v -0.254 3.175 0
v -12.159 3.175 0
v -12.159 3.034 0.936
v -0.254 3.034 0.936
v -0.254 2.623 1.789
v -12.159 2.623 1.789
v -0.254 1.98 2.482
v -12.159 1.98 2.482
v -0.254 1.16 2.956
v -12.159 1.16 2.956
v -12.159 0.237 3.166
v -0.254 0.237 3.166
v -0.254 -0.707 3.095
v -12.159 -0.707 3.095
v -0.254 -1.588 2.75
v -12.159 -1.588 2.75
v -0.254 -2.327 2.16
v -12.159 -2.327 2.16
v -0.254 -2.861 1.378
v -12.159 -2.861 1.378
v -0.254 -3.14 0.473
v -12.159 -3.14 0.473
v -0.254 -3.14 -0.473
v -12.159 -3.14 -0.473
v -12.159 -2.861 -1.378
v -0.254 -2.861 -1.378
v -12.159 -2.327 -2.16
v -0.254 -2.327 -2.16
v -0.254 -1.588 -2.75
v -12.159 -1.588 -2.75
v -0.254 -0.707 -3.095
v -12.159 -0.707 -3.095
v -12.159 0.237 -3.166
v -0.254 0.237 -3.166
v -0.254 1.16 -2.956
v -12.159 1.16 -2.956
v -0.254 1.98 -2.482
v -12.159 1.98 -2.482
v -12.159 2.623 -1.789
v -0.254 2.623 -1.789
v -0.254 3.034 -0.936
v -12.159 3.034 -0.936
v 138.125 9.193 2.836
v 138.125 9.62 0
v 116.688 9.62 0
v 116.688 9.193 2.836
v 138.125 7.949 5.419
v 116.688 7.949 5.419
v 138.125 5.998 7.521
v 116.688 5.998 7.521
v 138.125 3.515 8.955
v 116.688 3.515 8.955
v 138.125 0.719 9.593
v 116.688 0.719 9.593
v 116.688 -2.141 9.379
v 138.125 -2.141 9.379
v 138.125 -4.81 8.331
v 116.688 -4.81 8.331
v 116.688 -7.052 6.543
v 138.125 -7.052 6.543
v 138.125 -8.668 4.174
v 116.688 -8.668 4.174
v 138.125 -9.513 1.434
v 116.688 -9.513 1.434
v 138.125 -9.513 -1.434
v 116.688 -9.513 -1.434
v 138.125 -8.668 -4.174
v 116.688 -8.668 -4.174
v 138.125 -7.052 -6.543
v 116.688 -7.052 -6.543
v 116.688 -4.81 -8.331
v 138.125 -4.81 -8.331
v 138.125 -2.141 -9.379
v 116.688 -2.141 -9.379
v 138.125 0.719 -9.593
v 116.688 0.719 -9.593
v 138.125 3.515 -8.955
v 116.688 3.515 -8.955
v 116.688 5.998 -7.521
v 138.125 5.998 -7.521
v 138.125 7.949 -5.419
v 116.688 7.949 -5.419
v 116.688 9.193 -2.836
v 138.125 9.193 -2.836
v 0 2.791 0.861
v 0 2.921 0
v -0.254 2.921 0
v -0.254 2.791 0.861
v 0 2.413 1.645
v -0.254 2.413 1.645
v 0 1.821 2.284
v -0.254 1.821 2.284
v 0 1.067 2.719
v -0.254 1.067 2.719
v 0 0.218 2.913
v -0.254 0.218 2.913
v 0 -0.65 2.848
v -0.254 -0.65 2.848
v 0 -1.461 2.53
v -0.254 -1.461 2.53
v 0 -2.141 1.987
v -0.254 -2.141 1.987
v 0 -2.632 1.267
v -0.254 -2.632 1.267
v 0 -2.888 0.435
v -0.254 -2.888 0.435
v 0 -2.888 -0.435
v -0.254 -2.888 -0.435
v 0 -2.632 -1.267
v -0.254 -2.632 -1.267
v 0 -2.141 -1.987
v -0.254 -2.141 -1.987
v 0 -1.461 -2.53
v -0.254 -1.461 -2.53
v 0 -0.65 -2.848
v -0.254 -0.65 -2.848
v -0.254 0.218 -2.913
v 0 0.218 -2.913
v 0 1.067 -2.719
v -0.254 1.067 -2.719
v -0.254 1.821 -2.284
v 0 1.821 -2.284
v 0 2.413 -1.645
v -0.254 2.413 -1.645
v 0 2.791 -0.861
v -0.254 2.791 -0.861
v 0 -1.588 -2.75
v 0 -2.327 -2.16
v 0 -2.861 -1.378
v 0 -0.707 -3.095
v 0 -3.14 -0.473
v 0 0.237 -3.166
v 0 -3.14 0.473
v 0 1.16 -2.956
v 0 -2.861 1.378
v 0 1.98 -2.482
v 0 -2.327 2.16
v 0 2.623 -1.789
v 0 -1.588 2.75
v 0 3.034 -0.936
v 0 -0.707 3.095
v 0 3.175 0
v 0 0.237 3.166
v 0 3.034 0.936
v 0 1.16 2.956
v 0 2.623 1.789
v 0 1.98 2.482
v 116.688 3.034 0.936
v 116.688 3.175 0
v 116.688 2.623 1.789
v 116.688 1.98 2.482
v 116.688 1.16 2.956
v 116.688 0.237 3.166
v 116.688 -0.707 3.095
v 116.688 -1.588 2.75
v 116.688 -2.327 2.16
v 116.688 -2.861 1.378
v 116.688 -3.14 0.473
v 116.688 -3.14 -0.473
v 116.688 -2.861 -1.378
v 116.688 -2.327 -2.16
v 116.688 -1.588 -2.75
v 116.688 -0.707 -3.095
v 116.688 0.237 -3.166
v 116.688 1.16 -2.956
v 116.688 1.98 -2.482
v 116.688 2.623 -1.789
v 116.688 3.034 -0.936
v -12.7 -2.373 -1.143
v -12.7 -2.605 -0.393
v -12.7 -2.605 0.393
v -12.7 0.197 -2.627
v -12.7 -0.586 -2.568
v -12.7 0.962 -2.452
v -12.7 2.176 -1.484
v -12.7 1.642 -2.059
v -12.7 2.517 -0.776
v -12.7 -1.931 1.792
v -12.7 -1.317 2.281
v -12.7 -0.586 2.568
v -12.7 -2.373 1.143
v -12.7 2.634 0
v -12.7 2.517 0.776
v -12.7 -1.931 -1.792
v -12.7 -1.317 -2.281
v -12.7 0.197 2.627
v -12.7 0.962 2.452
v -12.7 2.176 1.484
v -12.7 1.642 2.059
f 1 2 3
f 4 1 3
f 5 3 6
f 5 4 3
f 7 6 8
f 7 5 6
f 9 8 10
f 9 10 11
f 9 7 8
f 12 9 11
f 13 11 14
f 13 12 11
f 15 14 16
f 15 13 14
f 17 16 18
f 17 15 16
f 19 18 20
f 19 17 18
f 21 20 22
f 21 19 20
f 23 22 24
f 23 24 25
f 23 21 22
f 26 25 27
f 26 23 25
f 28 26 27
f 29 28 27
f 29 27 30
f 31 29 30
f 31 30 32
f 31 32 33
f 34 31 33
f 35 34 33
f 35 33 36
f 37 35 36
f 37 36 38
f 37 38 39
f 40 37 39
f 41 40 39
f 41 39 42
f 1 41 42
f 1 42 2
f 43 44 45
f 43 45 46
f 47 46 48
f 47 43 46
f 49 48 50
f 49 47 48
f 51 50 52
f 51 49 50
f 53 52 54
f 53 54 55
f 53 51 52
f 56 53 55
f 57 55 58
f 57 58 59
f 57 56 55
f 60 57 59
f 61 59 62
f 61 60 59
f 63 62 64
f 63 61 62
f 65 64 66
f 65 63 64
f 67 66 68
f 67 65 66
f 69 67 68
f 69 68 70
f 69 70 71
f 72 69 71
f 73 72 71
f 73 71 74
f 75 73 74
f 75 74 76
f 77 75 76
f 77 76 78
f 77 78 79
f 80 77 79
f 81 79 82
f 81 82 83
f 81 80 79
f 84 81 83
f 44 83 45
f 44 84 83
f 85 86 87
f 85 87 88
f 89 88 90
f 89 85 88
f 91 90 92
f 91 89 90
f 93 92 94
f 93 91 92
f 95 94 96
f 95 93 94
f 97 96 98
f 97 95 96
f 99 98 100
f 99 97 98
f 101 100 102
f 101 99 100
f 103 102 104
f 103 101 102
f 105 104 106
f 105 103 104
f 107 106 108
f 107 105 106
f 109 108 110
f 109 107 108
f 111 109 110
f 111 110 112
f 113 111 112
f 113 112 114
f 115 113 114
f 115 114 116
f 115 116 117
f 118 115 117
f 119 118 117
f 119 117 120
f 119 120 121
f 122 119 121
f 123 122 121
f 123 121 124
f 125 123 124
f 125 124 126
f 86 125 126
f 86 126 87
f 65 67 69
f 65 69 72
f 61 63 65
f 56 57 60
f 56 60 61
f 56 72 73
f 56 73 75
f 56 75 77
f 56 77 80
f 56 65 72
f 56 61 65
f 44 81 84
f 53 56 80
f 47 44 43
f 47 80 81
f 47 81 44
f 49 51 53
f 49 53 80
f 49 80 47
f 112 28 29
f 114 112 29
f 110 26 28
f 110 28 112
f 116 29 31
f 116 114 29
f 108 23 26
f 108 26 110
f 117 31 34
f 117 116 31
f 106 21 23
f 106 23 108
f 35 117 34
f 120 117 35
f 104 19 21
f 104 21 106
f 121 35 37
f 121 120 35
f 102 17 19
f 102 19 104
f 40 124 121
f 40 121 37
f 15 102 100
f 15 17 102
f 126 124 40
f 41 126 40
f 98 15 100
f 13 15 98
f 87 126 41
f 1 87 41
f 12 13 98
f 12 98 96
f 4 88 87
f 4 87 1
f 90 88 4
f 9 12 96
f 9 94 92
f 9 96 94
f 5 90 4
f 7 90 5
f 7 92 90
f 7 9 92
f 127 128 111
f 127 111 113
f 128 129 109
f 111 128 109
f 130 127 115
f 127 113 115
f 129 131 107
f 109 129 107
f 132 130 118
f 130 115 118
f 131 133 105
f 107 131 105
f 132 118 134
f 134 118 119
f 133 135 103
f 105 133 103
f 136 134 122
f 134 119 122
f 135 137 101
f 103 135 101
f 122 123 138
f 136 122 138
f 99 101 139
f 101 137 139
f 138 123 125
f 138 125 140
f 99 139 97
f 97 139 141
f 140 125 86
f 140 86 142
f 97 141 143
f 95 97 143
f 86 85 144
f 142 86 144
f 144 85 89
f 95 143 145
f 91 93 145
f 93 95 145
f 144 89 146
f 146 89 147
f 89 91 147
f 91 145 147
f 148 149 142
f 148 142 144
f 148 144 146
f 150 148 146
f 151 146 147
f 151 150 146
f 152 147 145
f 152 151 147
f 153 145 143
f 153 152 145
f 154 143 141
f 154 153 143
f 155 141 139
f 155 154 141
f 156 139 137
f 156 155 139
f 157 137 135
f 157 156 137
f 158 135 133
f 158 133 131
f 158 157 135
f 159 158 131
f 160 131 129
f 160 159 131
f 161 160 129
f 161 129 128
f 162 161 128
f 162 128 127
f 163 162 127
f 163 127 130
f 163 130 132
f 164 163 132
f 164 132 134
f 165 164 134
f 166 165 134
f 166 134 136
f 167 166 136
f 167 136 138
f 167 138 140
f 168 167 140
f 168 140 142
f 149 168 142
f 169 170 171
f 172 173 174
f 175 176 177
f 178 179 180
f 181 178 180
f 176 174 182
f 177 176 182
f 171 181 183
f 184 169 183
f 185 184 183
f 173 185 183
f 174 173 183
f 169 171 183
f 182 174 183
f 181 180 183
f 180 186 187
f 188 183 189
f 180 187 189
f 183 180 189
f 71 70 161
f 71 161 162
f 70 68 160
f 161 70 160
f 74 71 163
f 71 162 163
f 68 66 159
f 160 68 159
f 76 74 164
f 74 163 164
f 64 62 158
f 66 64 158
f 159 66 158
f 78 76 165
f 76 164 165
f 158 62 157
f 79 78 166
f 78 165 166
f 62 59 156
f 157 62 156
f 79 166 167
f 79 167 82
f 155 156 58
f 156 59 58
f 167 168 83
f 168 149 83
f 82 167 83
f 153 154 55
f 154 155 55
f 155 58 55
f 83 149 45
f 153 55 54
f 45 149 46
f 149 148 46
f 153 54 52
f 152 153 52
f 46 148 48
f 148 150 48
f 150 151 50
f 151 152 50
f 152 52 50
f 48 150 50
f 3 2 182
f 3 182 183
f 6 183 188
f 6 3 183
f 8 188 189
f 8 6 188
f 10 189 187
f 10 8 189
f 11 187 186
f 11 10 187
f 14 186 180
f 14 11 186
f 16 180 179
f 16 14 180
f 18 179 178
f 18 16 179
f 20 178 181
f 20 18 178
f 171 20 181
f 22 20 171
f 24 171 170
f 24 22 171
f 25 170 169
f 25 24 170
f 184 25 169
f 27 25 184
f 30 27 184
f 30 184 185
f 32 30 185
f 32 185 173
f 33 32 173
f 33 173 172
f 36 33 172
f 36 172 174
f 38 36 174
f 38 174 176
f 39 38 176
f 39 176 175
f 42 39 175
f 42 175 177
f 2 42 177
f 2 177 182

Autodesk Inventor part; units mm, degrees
sketch "Sketch_1" plane through (0, 0, 0) normal (0, 0, 1) x (1, 0, 0)
  line L0 (138.1252, 0) -> (0, 0)
  line L1 (0, 0) -> (0, 3.175)
  line L2 (0, 3.175) -> (116.6876, 3.175)
  line L3 (116.6876, 3.175) -> (116.6876, 9.6203)
  line L4 (116.6876, 9.6203) -> (138.1252, 9.6203)
  line L5 (138.1252, 9.6203) -> (138.1252, 0)
  line L6 (138.1252, 0) -> (0, 0)
revolve "Revolution1" add sketch "Sketch_1" angle 360 about axis through (138.1252, 0, 0) along (1, 0, 0)
sketch "Sketch_3" plane through (0, 0, 0) normal (0, 0, 1) x (1, 0, 0)
  line L0 (0, 0) -> (-12.7, 0)
  line L1 (-12.7, 0) -> (-12.7, 2.634)
  line L2 (-12.7, 2.634) -> (-12.159, 3.175)
  line L3 (-12.159, 3.175) -> (0, 3.175)
  line L4 (0, 3.175) -> (0, 0)
  line L5 (0, 0) -> (-12.7, 0)
revolve "Revolution2" add sketch "Sketch_3" angle 360 about axis through (0, 0, 0) along (1, 0, 0)
thread "Thread1" size "1/4-28 UNF" class "2A" standard "ANSI Unified Screw Threads" length 12.159
sketch "Sketch_30" plane through (0, 0, 0) normal (0, 0, 1) x (1, 0, 0)
  line L0 (0, 0) -> (-0.254, 0)
  line L1 (-0.254, 2.921) -> (0, 2.921)
  line L2 (0, 2.921) -> (0, 3.429)
  line L3 (0, 3.429) -> (-0.254, 3.429)
  line L4 (-0.254, 3.429) -> (-0.254, 2.921)
revolve "Revolution3" cut sketch "Sketch_30" angle 360 about axis through (0, 0, 0) along (1, 0, 0)
ref_plane "dia1_XY" through (0, 3.175, 0) normal (1, 0, 0) x (0, 0, -1)
ref_plane "dia1_YZ" through (0, 3.175, 0) normal (0, 0, -1) x (0, 1, 0)
ref_plane "dia1_ZX" through (0, 3.175, 0) normal (0, 1, 0) x (1, 0, 0)
ref_plane "dia12_XY" through (0, 0, 10.9537) normal (1, 0, 0) x (0, 0, -1)
ref_plane "dia12_YZ" through (0, 0, 10.9537) normal (0, 0, -1) x (0, 1, 0)
ref_plane "dia12_ZX" through (0, 0, 10.9537) normal (0, 1, 0) x (1, 0, 0)
ref_plane "dia2_XY" through (0, -3.175, 0) normal (1, 0, 0) x (0, 0, -1)
ref_plane "dia2_YZ" through (0, -3.175, 0) normal (0, 0, -1) x (0, 1, 0)
ref_plane "dia2_ZX" through (0, -3.175, 0) normal (0, 1, 0) x (1, 0, 0)
ref_plane "dia22_XY" through (0, 0, -10.9537) normal (1, 0, 0) x (0, 0, -1)
ref_plane "dia22_YZ" through (0, 0, -10.9537) normal (0, 0, -1) x (0, 1, 0)
ref_plane "dia22_ZX" through (0, 0, -10.9537) normal (0, 1, 0) x (1, 0, 0)
ref_plane "rl1_XY" through (-12.7, 0, 0) normal (1, 0, 0) x (0, 0, -1)
ref_plane "rl1_YZ" through (-12.7, 0, 0) normal (0, 0, -1) x (0, 1, 0)
ref_plane "rl1_ZX" through (-12.7, 0, 0) normal (0, 1, 0) x (1, 0, 0)
ref_plane "rl2_XY" through (0, 0, 0) normal (1, 0, 0) x (0, 0, -1)
ref_plane "rl2_YZ" through (0, 0, 0) normal (0, 0, -1) x (0, 1, 0)
ref_plane "rl2_ZX" through (0, 0, 0) normal (0, 1, 0) x (1, 0, 0)
ref_plane "rod_cp_XY" through (0, 0, 0) normal (1, 0, 0) x (0, 0, -1)
ref_plane "rod_cp_YZ" through (0, 0, 0) normal (0, 0, -1) x (0, 1, 0)
ref_plane "rod_cp_ZX" through (0, 0, 0) normal (0, 1, 0) x (1, 0, 0)
ref_plane "thd1_XY" through (-12.7, 3.175, 0) normal (1, 0, 0) x (0, 0, -1)
ref_plane "thd1_YZ" through (-12.7, 3.175, 0) normal (0, 0, -1) x (0, 1, 0)
ref_plane "thd1_ZX" through (-12.7, 3.175, 0) normal (0, 1, 0) x (1, 0, 0)
ref_plane "thd2_XY" through (-12.7, -3.175, 0) normal (1, 0, 0) x (0, 0, -1)
ref_plane "thd2_YZ" through (-12.7, -3.175, 0) normal (0, 0, -1) x (0, 1, 0)
ref_plane "thd2_ZX" through (-12.7, -3.175, 0) normal (0, 1, 0) x (1, 0, 0)
ref_plane "to_rod_clevis_XY" through (-16.764, 0, 0) normal (1, 0, 0) x (0, 0, -1)
ref_plane "to_rod_clevis_YZ" through (-16.764, 0, 0) normal (0, 0, -1) x (0, 1, 0)
ref_plane "to_rod_clevis_ZX" through (-16.764, 0, 0) normal (0, 1, 0) x (1, 0, 0)
properties part number "C-043-DP0_rod"
